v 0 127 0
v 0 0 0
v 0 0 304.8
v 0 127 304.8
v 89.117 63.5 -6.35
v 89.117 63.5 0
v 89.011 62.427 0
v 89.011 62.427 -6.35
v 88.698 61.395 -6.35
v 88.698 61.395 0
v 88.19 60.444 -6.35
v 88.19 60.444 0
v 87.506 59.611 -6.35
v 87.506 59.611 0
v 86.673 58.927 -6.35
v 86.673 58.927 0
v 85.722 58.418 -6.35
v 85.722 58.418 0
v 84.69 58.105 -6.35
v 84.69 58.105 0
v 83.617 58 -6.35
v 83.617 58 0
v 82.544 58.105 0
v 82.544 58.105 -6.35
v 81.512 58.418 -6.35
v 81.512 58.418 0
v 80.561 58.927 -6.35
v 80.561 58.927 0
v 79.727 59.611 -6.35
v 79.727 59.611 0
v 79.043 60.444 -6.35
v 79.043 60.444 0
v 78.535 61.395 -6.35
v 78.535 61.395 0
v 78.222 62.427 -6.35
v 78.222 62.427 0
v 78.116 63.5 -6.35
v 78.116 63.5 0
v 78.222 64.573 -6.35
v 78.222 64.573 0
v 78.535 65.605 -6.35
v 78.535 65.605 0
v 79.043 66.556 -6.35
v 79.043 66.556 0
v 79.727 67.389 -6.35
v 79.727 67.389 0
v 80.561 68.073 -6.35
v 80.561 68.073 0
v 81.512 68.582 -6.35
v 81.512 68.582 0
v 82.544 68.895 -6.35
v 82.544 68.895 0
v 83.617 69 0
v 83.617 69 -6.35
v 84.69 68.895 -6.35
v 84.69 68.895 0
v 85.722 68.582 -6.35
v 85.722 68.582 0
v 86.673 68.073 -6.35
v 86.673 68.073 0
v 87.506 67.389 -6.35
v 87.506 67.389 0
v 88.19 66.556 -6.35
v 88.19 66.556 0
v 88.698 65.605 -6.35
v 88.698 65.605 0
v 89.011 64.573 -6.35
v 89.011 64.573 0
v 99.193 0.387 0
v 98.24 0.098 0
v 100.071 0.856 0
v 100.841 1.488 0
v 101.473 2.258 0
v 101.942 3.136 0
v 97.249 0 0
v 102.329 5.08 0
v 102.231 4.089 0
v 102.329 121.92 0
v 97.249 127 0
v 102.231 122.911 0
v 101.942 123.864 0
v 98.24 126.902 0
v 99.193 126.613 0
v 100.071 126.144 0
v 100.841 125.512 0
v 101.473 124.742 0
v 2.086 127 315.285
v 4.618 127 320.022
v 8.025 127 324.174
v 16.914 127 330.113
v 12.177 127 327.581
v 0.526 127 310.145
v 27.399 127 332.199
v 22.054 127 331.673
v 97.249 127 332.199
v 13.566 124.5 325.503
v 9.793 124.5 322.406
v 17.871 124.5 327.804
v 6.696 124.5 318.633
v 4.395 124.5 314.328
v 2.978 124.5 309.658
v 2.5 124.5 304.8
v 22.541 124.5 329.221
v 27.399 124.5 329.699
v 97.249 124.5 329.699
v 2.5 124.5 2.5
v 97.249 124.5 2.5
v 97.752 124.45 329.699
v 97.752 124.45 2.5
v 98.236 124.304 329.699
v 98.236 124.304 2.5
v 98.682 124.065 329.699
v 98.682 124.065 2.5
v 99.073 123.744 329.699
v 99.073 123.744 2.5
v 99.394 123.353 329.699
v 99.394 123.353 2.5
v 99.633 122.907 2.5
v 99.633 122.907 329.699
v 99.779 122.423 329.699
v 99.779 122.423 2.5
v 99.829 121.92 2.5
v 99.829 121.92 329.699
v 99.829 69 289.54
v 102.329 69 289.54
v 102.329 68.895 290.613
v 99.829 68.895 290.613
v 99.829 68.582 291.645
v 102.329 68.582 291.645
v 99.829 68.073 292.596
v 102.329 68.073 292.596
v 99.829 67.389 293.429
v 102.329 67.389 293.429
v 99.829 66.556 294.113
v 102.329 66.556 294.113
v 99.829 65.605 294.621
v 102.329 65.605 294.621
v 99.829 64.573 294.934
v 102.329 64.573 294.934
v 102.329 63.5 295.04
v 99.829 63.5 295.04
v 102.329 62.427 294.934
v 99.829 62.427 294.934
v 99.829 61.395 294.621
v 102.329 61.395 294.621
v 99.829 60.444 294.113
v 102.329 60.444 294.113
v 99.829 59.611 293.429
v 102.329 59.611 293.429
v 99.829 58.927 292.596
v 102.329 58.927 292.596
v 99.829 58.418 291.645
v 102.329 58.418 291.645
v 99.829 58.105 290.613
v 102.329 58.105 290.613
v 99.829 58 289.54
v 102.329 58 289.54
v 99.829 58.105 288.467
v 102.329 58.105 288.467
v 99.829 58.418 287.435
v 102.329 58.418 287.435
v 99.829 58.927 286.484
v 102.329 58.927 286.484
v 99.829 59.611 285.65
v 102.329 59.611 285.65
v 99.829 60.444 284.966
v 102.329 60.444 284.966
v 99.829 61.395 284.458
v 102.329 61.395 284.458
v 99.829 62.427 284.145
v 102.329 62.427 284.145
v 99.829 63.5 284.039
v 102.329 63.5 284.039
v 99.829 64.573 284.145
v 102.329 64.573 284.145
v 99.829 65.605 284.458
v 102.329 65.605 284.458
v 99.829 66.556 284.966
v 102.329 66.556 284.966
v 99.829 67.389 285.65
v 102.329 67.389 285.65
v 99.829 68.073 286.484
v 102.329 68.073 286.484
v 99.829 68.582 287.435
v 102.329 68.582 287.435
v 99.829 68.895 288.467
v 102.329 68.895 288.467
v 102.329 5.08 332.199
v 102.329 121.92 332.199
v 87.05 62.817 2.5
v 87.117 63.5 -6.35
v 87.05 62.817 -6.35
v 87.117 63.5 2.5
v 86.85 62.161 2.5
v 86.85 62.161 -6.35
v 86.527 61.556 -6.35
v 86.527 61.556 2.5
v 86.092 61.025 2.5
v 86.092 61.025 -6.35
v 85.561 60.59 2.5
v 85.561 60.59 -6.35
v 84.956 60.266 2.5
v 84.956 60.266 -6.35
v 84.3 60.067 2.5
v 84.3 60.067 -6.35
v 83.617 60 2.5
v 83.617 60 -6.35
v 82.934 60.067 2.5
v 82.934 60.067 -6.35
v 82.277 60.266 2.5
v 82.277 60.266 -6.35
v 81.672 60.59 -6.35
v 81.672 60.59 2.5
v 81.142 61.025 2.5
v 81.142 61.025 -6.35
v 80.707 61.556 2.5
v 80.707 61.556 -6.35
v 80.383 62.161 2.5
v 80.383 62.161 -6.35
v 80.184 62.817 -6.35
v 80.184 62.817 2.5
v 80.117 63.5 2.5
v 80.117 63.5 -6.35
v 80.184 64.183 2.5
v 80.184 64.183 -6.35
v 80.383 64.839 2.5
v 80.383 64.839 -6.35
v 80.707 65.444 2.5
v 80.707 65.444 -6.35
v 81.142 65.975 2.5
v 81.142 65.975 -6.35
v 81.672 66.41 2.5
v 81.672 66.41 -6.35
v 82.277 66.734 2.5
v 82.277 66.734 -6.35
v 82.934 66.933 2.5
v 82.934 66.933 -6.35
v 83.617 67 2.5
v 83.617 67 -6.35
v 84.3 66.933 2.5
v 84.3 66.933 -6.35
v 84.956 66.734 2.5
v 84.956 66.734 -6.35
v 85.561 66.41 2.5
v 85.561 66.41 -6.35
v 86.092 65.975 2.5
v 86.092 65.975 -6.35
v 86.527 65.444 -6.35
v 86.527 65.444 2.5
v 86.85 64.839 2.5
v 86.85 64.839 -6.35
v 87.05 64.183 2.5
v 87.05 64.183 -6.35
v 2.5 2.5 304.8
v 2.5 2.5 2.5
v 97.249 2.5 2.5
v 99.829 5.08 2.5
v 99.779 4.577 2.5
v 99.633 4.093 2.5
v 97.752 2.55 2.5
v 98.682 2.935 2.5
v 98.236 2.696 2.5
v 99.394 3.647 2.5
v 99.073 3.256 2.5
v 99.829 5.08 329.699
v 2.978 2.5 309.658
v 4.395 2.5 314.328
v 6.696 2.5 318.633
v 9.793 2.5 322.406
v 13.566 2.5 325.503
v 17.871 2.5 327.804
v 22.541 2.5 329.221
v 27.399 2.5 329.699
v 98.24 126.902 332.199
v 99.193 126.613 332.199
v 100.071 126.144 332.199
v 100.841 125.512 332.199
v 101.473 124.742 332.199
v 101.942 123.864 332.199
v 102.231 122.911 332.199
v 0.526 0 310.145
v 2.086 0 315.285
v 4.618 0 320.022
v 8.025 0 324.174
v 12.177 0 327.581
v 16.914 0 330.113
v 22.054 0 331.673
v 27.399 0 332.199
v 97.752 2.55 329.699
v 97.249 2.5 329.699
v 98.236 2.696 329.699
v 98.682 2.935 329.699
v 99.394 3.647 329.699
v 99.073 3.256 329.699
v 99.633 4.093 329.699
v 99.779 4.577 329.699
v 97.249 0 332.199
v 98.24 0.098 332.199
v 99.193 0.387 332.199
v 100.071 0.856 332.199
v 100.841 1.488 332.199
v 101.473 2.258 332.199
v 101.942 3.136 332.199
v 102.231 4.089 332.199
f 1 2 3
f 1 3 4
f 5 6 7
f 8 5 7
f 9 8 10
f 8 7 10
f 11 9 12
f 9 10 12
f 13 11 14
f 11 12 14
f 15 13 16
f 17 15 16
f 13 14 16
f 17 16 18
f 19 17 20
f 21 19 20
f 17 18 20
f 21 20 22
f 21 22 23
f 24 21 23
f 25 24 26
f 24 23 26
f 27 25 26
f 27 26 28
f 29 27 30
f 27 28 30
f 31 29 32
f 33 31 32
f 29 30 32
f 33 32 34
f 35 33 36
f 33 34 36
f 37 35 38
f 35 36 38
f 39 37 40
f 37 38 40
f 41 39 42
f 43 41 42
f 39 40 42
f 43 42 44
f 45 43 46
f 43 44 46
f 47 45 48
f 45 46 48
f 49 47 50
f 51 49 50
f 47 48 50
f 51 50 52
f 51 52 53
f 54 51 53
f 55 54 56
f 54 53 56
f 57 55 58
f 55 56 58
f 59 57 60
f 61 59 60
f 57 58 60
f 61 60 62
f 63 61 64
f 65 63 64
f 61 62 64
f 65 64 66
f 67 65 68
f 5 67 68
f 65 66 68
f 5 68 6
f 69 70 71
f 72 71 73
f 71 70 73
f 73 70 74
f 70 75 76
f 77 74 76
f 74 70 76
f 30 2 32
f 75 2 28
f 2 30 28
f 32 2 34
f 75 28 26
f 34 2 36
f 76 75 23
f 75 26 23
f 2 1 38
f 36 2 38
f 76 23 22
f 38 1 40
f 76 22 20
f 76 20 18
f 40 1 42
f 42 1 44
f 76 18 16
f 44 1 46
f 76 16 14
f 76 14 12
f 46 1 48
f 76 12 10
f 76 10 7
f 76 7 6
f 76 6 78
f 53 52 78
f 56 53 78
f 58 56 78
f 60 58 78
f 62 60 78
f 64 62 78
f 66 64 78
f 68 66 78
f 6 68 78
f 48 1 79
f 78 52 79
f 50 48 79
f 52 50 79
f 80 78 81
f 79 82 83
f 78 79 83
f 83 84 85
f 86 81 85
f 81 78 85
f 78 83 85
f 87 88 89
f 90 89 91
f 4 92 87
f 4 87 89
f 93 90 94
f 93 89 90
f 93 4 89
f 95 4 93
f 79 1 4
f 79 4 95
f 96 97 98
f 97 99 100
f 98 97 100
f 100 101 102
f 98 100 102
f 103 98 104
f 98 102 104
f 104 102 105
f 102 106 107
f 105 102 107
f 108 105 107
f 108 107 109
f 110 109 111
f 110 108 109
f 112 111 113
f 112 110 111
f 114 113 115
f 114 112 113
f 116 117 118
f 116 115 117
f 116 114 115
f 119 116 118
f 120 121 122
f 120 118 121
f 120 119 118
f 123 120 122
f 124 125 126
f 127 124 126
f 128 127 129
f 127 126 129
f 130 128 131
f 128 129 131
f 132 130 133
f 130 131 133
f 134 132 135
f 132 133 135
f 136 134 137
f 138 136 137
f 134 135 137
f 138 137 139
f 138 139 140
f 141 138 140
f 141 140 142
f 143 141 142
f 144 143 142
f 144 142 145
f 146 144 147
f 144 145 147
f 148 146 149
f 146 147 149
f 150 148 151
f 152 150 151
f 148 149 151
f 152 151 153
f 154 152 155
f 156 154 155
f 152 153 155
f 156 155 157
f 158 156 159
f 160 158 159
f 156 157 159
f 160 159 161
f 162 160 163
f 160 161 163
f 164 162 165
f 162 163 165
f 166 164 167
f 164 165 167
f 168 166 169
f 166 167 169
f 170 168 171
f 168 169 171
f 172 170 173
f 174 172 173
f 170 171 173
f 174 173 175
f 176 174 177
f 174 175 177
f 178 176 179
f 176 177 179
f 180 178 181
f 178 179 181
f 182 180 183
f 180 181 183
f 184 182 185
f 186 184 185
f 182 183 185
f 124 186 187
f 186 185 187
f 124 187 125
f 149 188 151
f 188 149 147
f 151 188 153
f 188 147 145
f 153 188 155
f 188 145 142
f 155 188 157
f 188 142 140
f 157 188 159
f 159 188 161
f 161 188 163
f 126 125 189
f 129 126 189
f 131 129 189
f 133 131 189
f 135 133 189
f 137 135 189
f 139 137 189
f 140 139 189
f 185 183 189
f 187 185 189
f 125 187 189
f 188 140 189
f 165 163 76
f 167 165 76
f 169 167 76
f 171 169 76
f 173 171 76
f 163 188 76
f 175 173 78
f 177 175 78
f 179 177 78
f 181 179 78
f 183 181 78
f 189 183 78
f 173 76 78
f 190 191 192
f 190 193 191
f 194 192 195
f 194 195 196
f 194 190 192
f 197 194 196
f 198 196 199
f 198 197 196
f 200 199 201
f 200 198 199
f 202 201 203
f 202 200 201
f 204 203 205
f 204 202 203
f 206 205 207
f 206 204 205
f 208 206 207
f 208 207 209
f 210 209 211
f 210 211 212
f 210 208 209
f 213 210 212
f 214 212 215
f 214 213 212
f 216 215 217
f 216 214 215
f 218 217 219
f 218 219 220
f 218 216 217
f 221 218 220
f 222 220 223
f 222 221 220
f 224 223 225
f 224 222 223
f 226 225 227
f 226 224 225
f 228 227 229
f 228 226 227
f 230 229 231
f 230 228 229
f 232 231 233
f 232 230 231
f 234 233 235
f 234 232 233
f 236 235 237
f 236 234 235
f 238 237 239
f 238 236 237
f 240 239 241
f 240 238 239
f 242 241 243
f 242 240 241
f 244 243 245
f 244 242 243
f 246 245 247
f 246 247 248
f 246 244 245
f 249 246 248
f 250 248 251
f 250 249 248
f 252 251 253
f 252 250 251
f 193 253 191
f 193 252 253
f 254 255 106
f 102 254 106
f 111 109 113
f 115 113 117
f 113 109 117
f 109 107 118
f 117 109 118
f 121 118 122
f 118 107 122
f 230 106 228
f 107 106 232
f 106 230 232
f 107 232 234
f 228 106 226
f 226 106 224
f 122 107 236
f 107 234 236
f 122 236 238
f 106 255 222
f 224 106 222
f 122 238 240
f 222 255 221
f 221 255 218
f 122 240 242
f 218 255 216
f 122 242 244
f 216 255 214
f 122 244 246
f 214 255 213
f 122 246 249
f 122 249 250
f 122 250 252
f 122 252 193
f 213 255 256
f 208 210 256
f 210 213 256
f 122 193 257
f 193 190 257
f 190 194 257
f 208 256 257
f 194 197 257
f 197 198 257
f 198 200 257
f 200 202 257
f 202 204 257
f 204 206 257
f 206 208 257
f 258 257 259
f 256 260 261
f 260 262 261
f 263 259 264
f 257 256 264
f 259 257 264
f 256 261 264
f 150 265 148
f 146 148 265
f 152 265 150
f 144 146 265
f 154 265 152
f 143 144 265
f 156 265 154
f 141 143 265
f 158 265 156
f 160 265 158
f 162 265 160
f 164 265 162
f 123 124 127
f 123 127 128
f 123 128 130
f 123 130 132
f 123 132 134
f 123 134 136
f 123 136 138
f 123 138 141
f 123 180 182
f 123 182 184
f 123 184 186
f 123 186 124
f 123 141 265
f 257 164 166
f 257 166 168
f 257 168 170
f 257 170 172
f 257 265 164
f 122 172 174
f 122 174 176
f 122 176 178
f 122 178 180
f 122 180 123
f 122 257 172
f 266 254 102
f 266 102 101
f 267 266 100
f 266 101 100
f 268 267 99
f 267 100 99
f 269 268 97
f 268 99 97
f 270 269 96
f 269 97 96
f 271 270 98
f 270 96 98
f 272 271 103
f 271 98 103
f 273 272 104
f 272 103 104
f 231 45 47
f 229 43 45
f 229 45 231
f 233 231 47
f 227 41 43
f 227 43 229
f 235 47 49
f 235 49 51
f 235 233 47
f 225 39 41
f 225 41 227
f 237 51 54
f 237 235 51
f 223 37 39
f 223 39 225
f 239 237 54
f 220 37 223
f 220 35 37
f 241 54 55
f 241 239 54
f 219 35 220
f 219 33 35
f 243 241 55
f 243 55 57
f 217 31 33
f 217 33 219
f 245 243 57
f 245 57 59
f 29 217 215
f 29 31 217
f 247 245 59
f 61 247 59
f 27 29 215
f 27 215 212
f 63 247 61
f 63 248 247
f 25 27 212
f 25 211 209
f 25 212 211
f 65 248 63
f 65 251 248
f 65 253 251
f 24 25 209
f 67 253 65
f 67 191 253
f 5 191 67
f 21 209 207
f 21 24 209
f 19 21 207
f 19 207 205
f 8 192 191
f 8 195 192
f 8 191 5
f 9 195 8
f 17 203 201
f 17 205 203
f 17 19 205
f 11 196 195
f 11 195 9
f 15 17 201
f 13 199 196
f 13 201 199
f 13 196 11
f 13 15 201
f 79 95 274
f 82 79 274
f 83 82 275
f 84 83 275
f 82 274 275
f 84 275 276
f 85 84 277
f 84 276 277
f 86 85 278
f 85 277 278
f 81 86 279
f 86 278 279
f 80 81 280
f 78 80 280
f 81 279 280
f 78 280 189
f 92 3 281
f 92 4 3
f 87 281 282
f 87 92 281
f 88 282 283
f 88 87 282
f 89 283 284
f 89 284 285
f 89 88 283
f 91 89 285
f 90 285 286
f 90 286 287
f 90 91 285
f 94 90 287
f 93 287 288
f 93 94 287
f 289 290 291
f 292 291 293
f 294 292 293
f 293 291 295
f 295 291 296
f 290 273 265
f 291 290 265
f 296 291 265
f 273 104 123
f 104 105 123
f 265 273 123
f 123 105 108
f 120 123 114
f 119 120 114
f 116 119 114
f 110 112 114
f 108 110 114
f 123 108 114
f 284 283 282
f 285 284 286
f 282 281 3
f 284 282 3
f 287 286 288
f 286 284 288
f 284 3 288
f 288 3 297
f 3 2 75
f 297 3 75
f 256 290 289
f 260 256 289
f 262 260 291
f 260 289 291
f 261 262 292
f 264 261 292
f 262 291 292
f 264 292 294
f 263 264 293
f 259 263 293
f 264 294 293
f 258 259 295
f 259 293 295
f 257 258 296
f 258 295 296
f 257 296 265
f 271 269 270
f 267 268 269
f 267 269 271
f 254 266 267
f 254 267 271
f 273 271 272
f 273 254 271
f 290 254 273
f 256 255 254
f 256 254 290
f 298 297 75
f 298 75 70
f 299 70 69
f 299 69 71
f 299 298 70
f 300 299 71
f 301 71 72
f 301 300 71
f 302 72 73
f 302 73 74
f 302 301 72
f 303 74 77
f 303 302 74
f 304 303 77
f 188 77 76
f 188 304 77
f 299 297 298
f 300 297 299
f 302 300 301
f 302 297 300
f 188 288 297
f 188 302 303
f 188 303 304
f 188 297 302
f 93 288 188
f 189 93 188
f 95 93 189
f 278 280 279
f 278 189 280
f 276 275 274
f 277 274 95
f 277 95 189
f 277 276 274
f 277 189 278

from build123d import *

# Parameters (mm, degrees)
F0_W      = 102.32898
F0_H      = 127
F1_DEPTH  = 332.19898
F2_R      = 27.39898
F3_R      = 5.08
F5_T      = -2.5
F7_DEPTH  = 2.5
F4_R      = 5.50037
F8_DEPTH  = 2.5
F9_R      = 5.50037
F9_R_2    = 3.5
F10_DEPTH = 6.35
F11_DEPTH = 2.5


with BuildPart() as f1:
    # F0 (on Top) → F1 (new body)
    with BuildSketch(Plane.XY):
        with Locations((51.16449, 63.5)):
            Rectangle(F0_W, F0_H)
    extrude(amount=F1_DEPTH)

    # F2
    f2_edges = [f1.edges().sort_by_distance(p)[0] for p in [
        (0, 63.5, 332.19898),
    ]]
    fillet(f2_edges, radius=F2_R)

    # F3
    f3_edges = [f1.edges().sort_by_distance(p)[0] for p in [
        (102.32898, 0, 166.09949),
        (102.32898, 127, 166.09949),
    ]]
    fillet(f3_edges, radius=F3_R)

    # F5
    f5_openings = [f1.faces().sort_by_distance(p)[0] for p in [
        (51.121814, 63.5, 0),
    ]]
    offset(amount=F5_T, openings=f5_openings)

    # F6 (on face) → F7 (join)
    with BuildSketch(Plane(origin=(0, 0, 0), x_dir=(1, 0, 0), z_dir=(0, 0, -1))):
        with BuildLine():
            Line((102.32898, -121.92), (102.32898, -5.08))
            ThreePointArc((102.32898, -5.08), (100.8410824484, -1.4878975516), (97.24898, 0))
            Line((97.24898, 0), (0, 0))
            Line((0, 0), (0, -127))
            Line((0, -127), (97.24898, -127))
            ThreePointArc((97.24898, -127), (100.8410824484, -125.5121024484), (102.32898, -121.92))
        make_face()
    extrude(amount=-F7_DEPTH)

    # F4 (on face) → F8 (cut, through all)
    with BuildSketch(Plane.YZ.offset(102.32898)):
        with Locations((63.5, 289.53968)):
            Circle(F4_R)
    extrude(amount=-F8_DEPTH, mode=Mode.SUBTRACT)

    # F9 (on face) → F10 (join)
    with BuildSketch(Plane(origin=(0, 0, 0), x_dir=(1, 0, 0), z_dir=(0, 0, -1))):
        with Locations((83.6168, -63.5)):
            Circle(F9_R)
        with Locations((83.6168, -63.5)):
            Circle(F9_R_2, mode=Mode.SUBTRACT)
    extrude(amount=F10_DEPTH)

    # F11 (cut, through all): a face of the model
    f11_faces = [f1.faces().sort_by_distance(p)[0] for p in [
        (83.6168, 63.5, 0),
    ]]
    extrude(f11_faces, amount=-F11_DEPTH, mode=Mode.SUBTRACT)


solid = f1.part
